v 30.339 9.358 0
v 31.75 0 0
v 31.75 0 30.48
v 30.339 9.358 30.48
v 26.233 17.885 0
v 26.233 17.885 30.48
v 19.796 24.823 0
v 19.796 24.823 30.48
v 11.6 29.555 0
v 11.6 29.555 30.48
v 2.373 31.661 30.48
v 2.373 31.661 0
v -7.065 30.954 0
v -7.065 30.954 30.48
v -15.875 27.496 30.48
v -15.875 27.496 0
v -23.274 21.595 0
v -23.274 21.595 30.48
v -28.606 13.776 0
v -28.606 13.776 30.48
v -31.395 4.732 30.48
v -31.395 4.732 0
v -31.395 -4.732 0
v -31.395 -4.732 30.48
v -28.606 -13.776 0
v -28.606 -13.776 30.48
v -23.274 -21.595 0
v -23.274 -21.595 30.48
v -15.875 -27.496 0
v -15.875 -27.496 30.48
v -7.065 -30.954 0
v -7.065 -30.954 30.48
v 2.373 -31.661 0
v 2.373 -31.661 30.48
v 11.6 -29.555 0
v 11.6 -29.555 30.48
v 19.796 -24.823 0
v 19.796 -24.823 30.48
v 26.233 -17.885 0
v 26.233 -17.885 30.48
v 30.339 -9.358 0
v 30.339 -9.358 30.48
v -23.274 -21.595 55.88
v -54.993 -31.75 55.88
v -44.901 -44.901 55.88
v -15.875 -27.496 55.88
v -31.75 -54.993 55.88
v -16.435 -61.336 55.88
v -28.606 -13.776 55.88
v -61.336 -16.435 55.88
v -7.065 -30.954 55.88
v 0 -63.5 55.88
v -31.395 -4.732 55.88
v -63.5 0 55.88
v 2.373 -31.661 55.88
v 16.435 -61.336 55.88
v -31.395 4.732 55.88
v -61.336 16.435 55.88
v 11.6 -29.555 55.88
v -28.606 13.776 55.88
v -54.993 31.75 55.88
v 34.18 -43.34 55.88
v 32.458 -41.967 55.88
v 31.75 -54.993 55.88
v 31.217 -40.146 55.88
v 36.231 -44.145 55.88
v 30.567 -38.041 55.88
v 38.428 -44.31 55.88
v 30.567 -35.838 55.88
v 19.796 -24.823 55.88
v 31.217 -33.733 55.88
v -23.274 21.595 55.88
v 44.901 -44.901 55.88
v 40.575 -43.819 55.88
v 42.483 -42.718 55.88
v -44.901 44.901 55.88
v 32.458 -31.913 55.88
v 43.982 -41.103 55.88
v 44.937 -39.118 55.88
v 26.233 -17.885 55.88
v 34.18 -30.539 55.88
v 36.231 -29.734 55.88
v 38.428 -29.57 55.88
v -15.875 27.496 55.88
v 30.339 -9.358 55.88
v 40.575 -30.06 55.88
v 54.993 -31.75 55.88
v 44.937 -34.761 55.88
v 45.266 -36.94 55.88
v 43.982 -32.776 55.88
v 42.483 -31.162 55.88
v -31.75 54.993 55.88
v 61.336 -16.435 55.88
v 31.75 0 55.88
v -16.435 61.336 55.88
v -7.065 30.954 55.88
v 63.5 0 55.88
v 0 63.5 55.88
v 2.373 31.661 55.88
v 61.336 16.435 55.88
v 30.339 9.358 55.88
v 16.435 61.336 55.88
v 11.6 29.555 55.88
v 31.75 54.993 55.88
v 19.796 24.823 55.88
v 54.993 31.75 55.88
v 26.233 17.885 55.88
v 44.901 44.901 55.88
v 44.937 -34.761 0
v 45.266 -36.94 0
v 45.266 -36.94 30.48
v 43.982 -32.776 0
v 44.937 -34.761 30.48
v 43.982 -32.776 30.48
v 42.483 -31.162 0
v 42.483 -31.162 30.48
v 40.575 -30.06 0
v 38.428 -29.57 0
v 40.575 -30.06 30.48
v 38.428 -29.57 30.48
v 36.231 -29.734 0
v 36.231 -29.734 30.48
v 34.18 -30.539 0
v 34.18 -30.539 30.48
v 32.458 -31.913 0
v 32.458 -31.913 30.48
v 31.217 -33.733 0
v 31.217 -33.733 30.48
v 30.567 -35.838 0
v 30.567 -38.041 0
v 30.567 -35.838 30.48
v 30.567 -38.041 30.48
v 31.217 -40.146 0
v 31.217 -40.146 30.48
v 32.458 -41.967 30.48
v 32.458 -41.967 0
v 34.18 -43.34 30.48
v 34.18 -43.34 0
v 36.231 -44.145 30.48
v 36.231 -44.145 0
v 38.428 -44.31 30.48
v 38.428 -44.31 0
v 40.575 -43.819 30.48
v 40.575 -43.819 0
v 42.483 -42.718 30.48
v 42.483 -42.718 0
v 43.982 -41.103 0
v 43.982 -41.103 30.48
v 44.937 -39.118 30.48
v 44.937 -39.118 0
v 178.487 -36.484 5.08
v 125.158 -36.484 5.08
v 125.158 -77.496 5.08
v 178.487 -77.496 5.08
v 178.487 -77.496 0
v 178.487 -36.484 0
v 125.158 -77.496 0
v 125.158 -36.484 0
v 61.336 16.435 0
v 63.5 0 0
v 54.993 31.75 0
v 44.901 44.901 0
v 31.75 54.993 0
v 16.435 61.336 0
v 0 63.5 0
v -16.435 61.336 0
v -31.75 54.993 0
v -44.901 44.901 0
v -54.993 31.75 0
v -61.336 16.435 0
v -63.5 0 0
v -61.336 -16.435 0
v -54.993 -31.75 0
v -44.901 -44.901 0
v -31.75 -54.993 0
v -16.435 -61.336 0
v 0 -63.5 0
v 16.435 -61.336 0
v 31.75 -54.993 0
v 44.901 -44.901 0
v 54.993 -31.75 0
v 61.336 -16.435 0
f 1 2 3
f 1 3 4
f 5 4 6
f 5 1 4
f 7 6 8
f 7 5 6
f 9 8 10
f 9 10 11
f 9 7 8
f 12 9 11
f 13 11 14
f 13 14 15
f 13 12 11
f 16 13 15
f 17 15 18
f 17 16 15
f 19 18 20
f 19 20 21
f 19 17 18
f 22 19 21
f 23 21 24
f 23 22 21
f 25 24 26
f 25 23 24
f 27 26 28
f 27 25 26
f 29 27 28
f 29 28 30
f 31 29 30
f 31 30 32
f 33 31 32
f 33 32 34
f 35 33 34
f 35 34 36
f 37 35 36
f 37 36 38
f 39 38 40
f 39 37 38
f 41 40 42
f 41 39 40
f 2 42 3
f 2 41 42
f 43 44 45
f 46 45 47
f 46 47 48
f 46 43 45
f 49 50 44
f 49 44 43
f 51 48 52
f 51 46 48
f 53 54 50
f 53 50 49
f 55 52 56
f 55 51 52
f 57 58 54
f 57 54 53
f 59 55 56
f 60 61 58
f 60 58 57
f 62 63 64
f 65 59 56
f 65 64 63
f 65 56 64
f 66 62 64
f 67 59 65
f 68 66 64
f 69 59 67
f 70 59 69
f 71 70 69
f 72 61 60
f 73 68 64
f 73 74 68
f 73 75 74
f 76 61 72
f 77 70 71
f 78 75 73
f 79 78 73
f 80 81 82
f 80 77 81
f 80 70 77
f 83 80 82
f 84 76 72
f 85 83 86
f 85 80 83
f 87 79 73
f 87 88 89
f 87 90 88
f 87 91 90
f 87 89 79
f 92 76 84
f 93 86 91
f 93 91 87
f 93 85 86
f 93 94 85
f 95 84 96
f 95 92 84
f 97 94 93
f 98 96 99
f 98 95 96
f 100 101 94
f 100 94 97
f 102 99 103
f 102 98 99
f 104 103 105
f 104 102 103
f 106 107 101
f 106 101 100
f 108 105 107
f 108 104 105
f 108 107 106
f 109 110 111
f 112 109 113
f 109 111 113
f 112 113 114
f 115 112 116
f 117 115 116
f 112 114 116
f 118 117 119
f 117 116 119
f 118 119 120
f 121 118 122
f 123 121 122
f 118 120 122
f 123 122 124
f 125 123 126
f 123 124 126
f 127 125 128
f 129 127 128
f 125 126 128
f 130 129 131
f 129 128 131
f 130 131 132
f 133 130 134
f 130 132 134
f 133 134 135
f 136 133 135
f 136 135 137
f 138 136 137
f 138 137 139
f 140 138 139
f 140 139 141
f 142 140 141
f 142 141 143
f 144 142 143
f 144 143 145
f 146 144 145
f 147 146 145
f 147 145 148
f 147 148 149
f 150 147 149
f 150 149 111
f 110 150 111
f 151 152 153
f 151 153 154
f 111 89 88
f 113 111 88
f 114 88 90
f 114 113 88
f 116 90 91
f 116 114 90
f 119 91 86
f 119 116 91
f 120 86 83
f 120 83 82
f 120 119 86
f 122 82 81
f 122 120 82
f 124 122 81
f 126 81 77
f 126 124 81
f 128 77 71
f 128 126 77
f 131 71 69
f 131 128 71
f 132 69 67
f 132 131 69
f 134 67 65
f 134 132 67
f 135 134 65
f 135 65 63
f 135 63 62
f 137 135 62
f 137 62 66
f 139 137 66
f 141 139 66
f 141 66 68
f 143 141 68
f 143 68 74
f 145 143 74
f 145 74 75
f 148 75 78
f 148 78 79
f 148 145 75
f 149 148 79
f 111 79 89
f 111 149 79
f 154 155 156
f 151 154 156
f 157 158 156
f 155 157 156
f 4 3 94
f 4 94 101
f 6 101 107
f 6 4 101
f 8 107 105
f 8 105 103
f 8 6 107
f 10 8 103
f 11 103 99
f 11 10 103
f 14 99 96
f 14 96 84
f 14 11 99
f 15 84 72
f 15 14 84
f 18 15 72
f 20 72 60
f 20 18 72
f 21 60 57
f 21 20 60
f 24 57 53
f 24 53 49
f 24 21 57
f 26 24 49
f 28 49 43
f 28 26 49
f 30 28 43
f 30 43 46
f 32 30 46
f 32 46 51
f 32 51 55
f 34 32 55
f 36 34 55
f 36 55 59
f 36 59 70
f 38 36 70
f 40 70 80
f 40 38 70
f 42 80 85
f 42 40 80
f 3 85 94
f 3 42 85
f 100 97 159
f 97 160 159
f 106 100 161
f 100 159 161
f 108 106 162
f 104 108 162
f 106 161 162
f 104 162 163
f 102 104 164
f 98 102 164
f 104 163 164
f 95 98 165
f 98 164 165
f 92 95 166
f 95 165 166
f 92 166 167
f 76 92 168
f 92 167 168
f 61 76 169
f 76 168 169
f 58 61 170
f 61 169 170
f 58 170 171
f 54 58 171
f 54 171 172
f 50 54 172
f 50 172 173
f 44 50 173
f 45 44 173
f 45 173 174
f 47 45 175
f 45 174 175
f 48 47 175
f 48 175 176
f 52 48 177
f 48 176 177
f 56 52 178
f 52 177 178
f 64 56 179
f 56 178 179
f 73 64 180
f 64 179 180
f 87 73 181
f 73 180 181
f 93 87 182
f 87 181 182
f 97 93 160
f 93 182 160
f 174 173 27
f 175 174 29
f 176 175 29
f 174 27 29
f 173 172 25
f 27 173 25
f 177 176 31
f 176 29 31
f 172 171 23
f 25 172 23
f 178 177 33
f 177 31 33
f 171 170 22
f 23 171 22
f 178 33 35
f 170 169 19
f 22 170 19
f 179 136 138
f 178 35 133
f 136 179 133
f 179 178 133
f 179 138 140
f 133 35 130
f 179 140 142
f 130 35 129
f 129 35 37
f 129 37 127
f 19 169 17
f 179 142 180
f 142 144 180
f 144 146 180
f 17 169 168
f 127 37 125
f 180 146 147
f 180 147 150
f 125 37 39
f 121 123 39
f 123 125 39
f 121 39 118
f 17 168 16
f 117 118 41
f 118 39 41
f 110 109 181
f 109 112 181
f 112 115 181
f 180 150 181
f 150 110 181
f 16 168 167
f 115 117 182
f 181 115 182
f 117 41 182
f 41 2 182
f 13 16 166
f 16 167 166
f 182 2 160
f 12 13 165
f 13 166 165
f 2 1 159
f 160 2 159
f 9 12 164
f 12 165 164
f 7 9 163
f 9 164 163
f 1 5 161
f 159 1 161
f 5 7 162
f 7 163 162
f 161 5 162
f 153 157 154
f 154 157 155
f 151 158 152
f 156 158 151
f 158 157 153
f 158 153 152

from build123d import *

# Parameters (mm, degrees)
F0_R        = 63.5
F0_R_2      = 31.75
F1_DEPTH    = 30.48
F2_R        = 7.390562
F3_DEPTH    = 127
F1_FACE_R   = 63.5
F1_FACE_R_2 = 7.390562
F1_FACE_R_3 = 31.75
F4_DEPTH    = 25.4
F5_W        = 53.329483
F5_H        = 41.01209
F6_DEPTH    = 5.08


with BuildPart() as f1:
    # F0 (on Top) → F1 (new body)
    with BuildSketch(Plane.XY):
        Circle(F0_R)
        Circle(F0_R_2, mode=Mode.SUBTRACT)
    extrude(amount=F1_DEPTH)

    # F2 (on face) → F3 (cut)
    with BuildSketch(Plane.XY.offset(30.48)):
        with Locations((37.87522, -36.939677)):
            Circle(F2_R)
    extrude(amount=-F3_DEPTH, mode=Mode.SUBTRACT)

    # F1_face (on face) → F4 (join)
    with BuildSketch(Plane.XY.offset(30.48)):
        Circle(F1_FACE_R)
        with Locations((37.87522, -36.939677)):
            Circle(F1_FACE_R_2, mode=Mode.SUBTRACT)
        Circle(F1_FACE_R_3, mode=Mode.SUBTRACT)
    extrude(amount=F4_DEPTH)


with BuildPart() as f6:
    # F5 (on Top) → F6 (new body)
    with BuildSketch(Plane.XY):
        with Locations((151.822605, -56.990417)):
            Rectangle(F5_W, F5_H)
    extrude(amount=F6_DEPTH)


solid = Compound([f1.part, f6.part])
